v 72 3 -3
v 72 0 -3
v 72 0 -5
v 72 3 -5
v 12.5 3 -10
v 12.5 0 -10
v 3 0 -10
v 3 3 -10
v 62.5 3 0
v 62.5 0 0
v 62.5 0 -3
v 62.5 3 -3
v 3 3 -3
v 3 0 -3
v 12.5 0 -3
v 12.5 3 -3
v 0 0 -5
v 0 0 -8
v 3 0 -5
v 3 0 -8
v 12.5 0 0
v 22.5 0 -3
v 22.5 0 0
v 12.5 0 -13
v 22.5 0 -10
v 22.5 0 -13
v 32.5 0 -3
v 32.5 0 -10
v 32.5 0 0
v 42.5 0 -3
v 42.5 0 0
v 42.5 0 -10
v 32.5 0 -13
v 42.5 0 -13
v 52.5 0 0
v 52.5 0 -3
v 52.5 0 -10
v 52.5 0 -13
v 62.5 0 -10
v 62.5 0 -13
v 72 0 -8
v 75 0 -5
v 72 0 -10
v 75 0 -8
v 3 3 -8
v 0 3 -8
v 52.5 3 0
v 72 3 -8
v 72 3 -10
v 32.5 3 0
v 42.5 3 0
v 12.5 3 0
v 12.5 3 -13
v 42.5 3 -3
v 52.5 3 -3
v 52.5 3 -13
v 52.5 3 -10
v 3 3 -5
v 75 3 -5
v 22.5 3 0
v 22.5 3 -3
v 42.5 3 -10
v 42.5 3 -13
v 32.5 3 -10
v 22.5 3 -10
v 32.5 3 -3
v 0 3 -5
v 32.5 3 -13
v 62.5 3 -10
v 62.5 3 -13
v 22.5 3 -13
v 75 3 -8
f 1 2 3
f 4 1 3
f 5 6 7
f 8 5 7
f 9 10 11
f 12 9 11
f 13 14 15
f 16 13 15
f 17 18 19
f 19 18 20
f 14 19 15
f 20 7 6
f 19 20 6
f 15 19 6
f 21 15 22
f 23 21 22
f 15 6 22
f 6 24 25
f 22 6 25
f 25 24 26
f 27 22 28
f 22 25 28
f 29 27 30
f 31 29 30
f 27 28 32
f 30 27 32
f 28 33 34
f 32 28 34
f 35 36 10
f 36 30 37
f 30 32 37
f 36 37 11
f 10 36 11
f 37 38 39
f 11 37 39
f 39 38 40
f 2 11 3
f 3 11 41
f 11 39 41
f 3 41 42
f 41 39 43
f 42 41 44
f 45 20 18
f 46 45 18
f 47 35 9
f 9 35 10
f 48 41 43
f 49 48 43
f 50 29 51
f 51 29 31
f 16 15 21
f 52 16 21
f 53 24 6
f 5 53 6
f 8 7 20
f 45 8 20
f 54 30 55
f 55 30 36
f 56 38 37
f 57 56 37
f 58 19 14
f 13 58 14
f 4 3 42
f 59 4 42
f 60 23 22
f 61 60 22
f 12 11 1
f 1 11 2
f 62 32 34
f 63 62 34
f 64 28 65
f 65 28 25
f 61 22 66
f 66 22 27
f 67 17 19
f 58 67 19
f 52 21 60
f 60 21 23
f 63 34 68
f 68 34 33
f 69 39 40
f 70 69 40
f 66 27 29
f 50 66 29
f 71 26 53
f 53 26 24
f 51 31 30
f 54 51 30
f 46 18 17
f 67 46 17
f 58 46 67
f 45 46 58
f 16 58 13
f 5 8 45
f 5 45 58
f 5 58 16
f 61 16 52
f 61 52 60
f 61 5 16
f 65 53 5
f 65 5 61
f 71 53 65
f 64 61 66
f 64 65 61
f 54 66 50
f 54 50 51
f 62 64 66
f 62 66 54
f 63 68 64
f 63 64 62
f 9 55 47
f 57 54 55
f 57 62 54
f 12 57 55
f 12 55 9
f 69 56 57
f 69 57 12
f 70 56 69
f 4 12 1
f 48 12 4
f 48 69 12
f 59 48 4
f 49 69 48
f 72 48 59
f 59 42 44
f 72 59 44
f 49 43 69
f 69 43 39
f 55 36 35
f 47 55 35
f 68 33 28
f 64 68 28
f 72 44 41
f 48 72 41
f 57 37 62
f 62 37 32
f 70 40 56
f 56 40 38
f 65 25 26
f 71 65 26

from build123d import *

# Parameters (mm, degrees)
SALIENTE_EXTRUIR1_DEPTH = 3


with BuildPart() as part:
    # Croquis1 → Saliente-Extruir1 (new body)
    with BuildSketch(Plane(origin=(0, 0, 0), x_dir=(1, 0, 0), z_dir=(0, 1, 0))):
        Polygon((12.5, 3), (12.5, 0), (22.5, 0), (22.5, 3), (32.5, 3), (32.5, 0), (42.5, 0), (42.5, 3), (52.5, 3), (52.5, 0), (62.5, 0), (62.5, 3), (72, 3), (72, 5), (75, 5), (75, 8), (72, 8), (72, 10), (62.5, 10), (62.5, 13), (52.5, 13), (52.5, 10), (42.5, 10), (42.5, 13), (37.5, 13), (32.5, 13), (32.5, 10), (22.5, 10), (22.5, 13), (12.5, 13), (12.5, 10), (3, 10), (3, 8), (0, 8), (0, 6.5), (0, 5), (3, 5), (3, 3), align=None)
    extrude(amount=SALIENTE_EXTRUIR1_DEPTH)


solid = part.part
